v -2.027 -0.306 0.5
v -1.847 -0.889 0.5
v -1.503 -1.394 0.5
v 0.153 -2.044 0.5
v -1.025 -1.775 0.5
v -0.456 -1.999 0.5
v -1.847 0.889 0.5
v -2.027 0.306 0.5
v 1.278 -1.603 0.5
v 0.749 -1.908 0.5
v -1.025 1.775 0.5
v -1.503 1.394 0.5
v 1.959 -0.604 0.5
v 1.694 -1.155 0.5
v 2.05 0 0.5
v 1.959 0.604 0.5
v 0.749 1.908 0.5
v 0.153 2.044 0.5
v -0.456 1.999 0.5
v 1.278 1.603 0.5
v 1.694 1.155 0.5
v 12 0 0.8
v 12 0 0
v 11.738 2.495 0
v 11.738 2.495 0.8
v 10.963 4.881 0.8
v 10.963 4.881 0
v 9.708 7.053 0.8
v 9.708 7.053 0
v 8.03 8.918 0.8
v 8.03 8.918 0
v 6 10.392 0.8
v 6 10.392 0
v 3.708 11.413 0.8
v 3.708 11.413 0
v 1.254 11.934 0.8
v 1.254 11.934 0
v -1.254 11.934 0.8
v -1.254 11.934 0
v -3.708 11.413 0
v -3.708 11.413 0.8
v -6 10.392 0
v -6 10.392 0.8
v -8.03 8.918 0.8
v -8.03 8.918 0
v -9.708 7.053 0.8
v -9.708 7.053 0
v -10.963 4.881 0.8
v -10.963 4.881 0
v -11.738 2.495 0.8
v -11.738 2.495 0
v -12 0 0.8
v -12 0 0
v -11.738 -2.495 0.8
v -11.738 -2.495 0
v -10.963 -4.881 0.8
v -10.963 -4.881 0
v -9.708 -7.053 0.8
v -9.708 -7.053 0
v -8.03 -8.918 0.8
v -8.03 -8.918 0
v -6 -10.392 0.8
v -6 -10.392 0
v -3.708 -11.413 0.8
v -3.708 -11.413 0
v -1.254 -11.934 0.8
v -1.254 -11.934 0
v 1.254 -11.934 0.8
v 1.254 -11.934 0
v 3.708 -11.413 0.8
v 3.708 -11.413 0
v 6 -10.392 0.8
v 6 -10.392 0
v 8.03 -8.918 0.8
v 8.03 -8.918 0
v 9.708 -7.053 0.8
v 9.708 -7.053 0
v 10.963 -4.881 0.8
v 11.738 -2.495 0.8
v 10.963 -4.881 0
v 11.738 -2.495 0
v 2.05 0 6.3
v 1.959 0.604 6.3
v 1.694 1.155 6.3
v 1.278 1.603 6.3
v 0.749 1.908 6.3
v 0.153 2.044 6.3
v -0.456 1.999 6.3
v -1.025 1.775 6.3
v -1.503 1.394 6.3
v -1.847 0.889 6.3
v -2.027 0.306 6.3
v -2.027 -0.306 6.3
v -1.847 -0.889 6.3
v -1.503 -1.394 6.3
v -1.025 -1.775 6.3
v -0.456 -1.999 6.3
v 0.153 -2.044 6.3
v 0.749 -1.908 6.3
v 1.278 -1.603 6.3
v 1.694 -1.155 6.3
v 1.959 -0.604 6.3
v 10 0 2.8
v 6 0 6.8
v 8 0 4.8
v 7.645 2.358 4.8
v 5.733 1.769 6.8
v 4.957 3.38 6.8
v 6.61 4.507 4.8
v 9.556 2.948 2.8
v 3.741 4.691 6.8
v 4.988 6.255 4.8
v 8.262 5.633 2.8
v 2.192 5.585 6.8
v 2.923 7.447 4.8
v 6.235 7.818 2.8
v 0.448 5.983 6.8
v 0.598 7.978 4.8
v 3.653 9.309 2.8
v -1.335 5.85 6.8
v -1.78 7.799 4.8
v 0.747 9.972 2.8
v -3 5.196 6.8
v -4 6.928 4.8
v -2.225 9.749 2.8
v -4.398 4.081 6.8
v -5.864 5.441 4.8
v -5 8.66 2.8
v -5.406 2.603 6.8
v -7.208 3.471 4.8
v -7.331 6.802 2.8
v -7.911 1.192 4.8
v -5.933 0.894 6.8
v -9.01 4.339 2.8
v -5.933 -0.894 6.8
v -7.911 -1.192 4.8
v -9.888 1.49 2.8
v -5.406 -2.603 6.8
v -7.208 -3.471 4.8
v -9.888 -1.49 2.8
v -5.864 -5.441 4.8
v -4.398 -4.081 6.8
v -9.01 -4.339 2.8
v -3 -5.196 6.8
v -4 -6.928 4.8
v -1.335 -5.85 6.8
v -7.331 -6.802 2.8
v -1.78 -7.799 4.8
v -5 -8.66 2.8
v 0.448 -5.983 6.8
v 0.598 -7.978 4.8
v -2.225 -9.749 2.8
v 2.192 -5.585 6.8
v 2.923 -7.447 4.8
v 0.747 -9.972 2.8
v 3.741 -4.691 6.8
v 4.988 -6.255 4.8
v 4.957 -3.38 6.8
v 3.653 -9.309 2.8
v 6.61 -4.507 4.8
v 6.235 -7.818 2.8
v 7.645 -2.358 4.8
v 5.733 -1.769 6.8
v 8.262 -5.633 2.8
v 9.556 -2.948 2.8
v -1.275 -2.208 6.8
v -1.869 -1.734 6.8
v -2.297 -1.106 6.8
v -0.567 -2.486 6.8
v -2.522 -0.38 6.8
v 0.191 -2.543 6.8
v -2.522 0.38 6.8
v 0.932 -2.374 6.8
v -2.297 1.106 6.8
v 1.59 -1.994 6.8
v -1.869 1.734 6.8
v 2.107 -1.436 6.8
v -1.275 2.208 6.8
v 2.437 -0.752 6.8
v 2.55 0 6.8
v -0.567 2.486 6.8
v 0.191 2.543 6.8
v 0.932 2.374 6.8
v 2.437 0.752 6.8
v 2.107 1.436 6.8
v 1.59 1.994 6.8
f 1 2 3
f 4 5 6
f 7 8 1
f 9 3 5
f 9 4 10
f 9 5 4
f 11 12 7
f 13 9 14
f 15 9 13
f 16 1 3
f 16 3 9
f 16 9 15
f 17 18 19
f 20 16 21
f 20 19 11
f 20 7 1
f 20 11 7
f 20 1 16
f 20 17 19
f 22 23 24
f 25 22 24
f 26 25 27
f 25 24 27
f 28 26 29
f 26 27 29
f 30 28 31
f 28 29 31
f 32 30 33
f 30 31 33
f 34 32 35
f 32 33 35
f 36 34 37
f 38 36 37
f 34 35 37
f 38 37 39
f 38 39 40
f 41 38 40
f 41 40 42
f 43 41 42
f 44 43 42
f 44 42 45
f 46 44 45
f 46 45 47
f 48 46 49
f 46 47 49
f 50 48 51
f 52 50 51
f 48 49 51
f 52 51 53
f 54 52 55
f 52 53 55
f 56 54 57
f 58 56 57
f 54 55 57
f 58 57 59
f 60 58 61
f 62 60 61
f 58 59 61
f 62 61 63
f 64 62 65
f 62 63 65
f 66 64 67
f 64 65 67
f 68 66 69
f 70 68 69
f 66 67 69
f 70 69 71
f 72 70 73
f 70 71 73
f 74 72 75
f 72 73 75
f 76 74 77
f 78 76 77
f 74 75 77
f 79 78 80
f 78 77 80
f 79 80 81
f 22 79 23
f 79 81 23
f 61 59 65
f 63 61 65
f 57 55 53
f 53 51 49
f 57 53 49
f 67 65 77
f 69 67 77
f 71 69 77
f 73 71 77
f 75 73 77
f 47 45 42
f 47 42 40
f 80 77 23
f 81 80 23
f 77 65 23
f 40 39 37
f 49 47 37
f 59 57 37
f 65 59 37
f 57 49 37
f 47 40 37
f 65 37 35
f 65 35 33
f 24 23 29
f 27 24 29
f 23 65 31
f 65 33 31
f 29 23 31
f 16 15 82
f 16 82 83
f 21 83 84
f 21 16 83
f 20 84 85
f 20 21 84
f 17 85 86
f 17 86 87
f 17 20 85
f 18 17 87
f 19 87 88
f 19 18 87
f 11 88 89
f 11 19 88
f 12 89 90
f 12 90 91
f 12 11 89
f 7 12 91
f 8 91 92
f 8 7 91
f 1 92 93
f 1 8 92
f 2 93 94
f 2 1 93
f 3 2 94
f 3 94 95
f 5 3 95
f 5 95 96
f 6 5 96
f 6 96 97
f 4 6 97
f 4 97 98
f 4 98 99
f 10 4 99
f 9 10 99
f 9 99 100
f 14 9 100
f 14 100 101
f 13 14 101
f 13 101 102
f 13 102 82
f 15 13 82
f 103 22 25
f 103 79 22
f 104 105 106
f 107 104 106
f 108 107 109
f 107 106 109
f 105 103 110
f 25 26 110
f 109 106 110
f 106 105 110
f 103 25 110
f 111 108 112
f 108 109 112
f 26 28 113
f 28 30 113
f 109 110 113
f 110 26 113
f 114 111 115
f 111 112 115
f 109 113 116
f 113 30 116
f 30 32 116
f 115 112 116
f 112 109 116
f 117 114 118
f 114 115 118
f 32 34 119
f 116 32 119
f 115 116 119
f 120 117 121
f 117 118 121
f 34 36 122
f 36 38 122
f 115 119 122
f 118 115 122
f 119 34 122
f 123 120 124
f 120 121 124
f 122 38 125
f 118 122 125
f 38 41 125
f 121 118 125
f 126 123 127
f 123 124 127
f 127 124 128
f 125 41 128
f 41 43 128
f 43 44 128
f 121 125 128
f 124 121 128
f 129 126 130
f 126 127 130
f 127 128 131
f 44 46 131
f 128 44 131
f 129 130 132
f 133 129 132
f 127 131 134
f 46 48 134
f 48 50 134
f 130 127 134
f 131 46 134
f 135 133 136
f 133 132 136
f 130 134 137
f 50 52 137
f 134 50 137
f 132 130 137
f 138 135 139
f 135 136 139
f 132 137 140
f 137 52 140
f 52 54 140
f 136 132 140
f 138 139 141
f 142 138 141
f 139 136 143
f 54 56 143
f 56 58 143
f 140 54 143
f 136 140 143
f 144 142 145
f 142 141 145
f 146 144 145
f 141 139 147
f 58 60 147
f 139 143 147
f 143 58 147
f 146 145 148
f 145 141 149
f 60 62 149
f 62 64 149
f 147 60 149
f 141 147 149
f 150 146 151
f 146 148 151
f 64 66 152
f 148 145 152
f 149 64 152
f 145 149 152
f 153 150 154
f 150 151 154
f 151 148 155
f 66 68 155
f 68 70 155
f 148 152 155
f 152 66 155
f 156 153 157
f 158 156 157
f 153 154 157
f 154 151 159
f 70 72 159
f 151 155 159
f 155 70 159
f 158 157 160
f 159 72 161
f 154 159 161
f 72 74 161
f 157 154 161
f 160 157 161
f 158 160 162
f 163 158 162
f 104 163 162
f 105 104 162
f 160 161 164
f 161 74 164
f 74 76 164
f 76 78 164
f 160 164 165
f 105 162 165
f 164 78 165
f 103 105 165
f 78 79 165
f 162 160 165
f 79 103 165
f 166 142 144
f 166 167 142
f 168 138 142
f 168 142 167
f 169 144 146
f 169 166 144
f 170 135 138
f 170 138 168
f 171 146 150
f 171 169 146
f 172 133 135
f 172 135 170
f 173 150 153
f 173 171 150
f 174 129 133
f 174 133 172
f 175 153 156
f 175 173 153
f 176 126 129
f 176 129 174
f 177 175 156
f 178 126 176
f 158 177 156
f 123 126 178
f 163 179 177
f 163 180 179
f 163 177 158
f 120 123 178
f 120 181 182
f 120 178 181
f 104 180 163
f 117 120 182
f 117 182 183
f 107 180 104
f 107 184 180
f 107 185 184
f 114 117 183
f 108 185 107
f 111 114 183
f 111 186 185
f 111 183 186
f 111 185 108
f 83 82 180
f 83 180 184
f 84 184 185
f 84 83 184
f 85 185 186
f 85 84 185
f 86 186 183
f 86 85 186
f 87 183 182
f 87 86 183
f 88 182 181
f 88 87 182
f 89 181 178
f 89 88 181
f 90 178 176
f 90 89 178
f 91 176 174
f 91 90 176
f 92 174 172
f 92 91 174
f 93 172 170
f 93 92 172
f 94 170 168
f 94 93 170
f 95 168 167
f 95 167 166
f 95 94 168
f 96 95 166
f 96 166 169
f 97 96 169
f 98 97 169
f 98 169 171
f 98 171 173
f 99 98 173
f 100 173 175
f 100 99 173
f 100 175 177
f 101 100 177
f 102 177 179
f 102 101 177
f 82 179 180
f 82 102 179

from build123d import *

# Parameters (mm, degrees)
F0_R     = 12
F0_R_2   = 2.05
F1_DEPTH = 6.8
F2_DEPTH = 0.5
F3_SIZE  = 0.5
F4_SIZE  = 6


with BuildPart() as f1:
    # F0 (on Top) → F1 (new body)
    with BuildSketch(Plane.XY):
        Circle(F0_R)
        Circle(F0_R_2, mode=Mode.SUBTRACT)
    extrude(amount=F1_DEPTH)

    # F0 (on Top) → F2 (join)
    with BuildSketch(Plane.XY):
        Circle(F0_R_2)
    extrude(amount=F2_DEPTH)

    # F3
    f3_edges = [f1.edges().sort_by_distance(p)[0] for p in [
        (-2.05, 0, 6.8),
    ]]
    chamfer(f3_edges, length=F3_SIZE)

    # F4
    f4_edges = [f1.edges().sort_by_distance(p)[0] for p in [
        (-12, 0, 6.8),
    ]]
    chamfer(f4_edges, length=F4_SIZE)


solid = f1.part
